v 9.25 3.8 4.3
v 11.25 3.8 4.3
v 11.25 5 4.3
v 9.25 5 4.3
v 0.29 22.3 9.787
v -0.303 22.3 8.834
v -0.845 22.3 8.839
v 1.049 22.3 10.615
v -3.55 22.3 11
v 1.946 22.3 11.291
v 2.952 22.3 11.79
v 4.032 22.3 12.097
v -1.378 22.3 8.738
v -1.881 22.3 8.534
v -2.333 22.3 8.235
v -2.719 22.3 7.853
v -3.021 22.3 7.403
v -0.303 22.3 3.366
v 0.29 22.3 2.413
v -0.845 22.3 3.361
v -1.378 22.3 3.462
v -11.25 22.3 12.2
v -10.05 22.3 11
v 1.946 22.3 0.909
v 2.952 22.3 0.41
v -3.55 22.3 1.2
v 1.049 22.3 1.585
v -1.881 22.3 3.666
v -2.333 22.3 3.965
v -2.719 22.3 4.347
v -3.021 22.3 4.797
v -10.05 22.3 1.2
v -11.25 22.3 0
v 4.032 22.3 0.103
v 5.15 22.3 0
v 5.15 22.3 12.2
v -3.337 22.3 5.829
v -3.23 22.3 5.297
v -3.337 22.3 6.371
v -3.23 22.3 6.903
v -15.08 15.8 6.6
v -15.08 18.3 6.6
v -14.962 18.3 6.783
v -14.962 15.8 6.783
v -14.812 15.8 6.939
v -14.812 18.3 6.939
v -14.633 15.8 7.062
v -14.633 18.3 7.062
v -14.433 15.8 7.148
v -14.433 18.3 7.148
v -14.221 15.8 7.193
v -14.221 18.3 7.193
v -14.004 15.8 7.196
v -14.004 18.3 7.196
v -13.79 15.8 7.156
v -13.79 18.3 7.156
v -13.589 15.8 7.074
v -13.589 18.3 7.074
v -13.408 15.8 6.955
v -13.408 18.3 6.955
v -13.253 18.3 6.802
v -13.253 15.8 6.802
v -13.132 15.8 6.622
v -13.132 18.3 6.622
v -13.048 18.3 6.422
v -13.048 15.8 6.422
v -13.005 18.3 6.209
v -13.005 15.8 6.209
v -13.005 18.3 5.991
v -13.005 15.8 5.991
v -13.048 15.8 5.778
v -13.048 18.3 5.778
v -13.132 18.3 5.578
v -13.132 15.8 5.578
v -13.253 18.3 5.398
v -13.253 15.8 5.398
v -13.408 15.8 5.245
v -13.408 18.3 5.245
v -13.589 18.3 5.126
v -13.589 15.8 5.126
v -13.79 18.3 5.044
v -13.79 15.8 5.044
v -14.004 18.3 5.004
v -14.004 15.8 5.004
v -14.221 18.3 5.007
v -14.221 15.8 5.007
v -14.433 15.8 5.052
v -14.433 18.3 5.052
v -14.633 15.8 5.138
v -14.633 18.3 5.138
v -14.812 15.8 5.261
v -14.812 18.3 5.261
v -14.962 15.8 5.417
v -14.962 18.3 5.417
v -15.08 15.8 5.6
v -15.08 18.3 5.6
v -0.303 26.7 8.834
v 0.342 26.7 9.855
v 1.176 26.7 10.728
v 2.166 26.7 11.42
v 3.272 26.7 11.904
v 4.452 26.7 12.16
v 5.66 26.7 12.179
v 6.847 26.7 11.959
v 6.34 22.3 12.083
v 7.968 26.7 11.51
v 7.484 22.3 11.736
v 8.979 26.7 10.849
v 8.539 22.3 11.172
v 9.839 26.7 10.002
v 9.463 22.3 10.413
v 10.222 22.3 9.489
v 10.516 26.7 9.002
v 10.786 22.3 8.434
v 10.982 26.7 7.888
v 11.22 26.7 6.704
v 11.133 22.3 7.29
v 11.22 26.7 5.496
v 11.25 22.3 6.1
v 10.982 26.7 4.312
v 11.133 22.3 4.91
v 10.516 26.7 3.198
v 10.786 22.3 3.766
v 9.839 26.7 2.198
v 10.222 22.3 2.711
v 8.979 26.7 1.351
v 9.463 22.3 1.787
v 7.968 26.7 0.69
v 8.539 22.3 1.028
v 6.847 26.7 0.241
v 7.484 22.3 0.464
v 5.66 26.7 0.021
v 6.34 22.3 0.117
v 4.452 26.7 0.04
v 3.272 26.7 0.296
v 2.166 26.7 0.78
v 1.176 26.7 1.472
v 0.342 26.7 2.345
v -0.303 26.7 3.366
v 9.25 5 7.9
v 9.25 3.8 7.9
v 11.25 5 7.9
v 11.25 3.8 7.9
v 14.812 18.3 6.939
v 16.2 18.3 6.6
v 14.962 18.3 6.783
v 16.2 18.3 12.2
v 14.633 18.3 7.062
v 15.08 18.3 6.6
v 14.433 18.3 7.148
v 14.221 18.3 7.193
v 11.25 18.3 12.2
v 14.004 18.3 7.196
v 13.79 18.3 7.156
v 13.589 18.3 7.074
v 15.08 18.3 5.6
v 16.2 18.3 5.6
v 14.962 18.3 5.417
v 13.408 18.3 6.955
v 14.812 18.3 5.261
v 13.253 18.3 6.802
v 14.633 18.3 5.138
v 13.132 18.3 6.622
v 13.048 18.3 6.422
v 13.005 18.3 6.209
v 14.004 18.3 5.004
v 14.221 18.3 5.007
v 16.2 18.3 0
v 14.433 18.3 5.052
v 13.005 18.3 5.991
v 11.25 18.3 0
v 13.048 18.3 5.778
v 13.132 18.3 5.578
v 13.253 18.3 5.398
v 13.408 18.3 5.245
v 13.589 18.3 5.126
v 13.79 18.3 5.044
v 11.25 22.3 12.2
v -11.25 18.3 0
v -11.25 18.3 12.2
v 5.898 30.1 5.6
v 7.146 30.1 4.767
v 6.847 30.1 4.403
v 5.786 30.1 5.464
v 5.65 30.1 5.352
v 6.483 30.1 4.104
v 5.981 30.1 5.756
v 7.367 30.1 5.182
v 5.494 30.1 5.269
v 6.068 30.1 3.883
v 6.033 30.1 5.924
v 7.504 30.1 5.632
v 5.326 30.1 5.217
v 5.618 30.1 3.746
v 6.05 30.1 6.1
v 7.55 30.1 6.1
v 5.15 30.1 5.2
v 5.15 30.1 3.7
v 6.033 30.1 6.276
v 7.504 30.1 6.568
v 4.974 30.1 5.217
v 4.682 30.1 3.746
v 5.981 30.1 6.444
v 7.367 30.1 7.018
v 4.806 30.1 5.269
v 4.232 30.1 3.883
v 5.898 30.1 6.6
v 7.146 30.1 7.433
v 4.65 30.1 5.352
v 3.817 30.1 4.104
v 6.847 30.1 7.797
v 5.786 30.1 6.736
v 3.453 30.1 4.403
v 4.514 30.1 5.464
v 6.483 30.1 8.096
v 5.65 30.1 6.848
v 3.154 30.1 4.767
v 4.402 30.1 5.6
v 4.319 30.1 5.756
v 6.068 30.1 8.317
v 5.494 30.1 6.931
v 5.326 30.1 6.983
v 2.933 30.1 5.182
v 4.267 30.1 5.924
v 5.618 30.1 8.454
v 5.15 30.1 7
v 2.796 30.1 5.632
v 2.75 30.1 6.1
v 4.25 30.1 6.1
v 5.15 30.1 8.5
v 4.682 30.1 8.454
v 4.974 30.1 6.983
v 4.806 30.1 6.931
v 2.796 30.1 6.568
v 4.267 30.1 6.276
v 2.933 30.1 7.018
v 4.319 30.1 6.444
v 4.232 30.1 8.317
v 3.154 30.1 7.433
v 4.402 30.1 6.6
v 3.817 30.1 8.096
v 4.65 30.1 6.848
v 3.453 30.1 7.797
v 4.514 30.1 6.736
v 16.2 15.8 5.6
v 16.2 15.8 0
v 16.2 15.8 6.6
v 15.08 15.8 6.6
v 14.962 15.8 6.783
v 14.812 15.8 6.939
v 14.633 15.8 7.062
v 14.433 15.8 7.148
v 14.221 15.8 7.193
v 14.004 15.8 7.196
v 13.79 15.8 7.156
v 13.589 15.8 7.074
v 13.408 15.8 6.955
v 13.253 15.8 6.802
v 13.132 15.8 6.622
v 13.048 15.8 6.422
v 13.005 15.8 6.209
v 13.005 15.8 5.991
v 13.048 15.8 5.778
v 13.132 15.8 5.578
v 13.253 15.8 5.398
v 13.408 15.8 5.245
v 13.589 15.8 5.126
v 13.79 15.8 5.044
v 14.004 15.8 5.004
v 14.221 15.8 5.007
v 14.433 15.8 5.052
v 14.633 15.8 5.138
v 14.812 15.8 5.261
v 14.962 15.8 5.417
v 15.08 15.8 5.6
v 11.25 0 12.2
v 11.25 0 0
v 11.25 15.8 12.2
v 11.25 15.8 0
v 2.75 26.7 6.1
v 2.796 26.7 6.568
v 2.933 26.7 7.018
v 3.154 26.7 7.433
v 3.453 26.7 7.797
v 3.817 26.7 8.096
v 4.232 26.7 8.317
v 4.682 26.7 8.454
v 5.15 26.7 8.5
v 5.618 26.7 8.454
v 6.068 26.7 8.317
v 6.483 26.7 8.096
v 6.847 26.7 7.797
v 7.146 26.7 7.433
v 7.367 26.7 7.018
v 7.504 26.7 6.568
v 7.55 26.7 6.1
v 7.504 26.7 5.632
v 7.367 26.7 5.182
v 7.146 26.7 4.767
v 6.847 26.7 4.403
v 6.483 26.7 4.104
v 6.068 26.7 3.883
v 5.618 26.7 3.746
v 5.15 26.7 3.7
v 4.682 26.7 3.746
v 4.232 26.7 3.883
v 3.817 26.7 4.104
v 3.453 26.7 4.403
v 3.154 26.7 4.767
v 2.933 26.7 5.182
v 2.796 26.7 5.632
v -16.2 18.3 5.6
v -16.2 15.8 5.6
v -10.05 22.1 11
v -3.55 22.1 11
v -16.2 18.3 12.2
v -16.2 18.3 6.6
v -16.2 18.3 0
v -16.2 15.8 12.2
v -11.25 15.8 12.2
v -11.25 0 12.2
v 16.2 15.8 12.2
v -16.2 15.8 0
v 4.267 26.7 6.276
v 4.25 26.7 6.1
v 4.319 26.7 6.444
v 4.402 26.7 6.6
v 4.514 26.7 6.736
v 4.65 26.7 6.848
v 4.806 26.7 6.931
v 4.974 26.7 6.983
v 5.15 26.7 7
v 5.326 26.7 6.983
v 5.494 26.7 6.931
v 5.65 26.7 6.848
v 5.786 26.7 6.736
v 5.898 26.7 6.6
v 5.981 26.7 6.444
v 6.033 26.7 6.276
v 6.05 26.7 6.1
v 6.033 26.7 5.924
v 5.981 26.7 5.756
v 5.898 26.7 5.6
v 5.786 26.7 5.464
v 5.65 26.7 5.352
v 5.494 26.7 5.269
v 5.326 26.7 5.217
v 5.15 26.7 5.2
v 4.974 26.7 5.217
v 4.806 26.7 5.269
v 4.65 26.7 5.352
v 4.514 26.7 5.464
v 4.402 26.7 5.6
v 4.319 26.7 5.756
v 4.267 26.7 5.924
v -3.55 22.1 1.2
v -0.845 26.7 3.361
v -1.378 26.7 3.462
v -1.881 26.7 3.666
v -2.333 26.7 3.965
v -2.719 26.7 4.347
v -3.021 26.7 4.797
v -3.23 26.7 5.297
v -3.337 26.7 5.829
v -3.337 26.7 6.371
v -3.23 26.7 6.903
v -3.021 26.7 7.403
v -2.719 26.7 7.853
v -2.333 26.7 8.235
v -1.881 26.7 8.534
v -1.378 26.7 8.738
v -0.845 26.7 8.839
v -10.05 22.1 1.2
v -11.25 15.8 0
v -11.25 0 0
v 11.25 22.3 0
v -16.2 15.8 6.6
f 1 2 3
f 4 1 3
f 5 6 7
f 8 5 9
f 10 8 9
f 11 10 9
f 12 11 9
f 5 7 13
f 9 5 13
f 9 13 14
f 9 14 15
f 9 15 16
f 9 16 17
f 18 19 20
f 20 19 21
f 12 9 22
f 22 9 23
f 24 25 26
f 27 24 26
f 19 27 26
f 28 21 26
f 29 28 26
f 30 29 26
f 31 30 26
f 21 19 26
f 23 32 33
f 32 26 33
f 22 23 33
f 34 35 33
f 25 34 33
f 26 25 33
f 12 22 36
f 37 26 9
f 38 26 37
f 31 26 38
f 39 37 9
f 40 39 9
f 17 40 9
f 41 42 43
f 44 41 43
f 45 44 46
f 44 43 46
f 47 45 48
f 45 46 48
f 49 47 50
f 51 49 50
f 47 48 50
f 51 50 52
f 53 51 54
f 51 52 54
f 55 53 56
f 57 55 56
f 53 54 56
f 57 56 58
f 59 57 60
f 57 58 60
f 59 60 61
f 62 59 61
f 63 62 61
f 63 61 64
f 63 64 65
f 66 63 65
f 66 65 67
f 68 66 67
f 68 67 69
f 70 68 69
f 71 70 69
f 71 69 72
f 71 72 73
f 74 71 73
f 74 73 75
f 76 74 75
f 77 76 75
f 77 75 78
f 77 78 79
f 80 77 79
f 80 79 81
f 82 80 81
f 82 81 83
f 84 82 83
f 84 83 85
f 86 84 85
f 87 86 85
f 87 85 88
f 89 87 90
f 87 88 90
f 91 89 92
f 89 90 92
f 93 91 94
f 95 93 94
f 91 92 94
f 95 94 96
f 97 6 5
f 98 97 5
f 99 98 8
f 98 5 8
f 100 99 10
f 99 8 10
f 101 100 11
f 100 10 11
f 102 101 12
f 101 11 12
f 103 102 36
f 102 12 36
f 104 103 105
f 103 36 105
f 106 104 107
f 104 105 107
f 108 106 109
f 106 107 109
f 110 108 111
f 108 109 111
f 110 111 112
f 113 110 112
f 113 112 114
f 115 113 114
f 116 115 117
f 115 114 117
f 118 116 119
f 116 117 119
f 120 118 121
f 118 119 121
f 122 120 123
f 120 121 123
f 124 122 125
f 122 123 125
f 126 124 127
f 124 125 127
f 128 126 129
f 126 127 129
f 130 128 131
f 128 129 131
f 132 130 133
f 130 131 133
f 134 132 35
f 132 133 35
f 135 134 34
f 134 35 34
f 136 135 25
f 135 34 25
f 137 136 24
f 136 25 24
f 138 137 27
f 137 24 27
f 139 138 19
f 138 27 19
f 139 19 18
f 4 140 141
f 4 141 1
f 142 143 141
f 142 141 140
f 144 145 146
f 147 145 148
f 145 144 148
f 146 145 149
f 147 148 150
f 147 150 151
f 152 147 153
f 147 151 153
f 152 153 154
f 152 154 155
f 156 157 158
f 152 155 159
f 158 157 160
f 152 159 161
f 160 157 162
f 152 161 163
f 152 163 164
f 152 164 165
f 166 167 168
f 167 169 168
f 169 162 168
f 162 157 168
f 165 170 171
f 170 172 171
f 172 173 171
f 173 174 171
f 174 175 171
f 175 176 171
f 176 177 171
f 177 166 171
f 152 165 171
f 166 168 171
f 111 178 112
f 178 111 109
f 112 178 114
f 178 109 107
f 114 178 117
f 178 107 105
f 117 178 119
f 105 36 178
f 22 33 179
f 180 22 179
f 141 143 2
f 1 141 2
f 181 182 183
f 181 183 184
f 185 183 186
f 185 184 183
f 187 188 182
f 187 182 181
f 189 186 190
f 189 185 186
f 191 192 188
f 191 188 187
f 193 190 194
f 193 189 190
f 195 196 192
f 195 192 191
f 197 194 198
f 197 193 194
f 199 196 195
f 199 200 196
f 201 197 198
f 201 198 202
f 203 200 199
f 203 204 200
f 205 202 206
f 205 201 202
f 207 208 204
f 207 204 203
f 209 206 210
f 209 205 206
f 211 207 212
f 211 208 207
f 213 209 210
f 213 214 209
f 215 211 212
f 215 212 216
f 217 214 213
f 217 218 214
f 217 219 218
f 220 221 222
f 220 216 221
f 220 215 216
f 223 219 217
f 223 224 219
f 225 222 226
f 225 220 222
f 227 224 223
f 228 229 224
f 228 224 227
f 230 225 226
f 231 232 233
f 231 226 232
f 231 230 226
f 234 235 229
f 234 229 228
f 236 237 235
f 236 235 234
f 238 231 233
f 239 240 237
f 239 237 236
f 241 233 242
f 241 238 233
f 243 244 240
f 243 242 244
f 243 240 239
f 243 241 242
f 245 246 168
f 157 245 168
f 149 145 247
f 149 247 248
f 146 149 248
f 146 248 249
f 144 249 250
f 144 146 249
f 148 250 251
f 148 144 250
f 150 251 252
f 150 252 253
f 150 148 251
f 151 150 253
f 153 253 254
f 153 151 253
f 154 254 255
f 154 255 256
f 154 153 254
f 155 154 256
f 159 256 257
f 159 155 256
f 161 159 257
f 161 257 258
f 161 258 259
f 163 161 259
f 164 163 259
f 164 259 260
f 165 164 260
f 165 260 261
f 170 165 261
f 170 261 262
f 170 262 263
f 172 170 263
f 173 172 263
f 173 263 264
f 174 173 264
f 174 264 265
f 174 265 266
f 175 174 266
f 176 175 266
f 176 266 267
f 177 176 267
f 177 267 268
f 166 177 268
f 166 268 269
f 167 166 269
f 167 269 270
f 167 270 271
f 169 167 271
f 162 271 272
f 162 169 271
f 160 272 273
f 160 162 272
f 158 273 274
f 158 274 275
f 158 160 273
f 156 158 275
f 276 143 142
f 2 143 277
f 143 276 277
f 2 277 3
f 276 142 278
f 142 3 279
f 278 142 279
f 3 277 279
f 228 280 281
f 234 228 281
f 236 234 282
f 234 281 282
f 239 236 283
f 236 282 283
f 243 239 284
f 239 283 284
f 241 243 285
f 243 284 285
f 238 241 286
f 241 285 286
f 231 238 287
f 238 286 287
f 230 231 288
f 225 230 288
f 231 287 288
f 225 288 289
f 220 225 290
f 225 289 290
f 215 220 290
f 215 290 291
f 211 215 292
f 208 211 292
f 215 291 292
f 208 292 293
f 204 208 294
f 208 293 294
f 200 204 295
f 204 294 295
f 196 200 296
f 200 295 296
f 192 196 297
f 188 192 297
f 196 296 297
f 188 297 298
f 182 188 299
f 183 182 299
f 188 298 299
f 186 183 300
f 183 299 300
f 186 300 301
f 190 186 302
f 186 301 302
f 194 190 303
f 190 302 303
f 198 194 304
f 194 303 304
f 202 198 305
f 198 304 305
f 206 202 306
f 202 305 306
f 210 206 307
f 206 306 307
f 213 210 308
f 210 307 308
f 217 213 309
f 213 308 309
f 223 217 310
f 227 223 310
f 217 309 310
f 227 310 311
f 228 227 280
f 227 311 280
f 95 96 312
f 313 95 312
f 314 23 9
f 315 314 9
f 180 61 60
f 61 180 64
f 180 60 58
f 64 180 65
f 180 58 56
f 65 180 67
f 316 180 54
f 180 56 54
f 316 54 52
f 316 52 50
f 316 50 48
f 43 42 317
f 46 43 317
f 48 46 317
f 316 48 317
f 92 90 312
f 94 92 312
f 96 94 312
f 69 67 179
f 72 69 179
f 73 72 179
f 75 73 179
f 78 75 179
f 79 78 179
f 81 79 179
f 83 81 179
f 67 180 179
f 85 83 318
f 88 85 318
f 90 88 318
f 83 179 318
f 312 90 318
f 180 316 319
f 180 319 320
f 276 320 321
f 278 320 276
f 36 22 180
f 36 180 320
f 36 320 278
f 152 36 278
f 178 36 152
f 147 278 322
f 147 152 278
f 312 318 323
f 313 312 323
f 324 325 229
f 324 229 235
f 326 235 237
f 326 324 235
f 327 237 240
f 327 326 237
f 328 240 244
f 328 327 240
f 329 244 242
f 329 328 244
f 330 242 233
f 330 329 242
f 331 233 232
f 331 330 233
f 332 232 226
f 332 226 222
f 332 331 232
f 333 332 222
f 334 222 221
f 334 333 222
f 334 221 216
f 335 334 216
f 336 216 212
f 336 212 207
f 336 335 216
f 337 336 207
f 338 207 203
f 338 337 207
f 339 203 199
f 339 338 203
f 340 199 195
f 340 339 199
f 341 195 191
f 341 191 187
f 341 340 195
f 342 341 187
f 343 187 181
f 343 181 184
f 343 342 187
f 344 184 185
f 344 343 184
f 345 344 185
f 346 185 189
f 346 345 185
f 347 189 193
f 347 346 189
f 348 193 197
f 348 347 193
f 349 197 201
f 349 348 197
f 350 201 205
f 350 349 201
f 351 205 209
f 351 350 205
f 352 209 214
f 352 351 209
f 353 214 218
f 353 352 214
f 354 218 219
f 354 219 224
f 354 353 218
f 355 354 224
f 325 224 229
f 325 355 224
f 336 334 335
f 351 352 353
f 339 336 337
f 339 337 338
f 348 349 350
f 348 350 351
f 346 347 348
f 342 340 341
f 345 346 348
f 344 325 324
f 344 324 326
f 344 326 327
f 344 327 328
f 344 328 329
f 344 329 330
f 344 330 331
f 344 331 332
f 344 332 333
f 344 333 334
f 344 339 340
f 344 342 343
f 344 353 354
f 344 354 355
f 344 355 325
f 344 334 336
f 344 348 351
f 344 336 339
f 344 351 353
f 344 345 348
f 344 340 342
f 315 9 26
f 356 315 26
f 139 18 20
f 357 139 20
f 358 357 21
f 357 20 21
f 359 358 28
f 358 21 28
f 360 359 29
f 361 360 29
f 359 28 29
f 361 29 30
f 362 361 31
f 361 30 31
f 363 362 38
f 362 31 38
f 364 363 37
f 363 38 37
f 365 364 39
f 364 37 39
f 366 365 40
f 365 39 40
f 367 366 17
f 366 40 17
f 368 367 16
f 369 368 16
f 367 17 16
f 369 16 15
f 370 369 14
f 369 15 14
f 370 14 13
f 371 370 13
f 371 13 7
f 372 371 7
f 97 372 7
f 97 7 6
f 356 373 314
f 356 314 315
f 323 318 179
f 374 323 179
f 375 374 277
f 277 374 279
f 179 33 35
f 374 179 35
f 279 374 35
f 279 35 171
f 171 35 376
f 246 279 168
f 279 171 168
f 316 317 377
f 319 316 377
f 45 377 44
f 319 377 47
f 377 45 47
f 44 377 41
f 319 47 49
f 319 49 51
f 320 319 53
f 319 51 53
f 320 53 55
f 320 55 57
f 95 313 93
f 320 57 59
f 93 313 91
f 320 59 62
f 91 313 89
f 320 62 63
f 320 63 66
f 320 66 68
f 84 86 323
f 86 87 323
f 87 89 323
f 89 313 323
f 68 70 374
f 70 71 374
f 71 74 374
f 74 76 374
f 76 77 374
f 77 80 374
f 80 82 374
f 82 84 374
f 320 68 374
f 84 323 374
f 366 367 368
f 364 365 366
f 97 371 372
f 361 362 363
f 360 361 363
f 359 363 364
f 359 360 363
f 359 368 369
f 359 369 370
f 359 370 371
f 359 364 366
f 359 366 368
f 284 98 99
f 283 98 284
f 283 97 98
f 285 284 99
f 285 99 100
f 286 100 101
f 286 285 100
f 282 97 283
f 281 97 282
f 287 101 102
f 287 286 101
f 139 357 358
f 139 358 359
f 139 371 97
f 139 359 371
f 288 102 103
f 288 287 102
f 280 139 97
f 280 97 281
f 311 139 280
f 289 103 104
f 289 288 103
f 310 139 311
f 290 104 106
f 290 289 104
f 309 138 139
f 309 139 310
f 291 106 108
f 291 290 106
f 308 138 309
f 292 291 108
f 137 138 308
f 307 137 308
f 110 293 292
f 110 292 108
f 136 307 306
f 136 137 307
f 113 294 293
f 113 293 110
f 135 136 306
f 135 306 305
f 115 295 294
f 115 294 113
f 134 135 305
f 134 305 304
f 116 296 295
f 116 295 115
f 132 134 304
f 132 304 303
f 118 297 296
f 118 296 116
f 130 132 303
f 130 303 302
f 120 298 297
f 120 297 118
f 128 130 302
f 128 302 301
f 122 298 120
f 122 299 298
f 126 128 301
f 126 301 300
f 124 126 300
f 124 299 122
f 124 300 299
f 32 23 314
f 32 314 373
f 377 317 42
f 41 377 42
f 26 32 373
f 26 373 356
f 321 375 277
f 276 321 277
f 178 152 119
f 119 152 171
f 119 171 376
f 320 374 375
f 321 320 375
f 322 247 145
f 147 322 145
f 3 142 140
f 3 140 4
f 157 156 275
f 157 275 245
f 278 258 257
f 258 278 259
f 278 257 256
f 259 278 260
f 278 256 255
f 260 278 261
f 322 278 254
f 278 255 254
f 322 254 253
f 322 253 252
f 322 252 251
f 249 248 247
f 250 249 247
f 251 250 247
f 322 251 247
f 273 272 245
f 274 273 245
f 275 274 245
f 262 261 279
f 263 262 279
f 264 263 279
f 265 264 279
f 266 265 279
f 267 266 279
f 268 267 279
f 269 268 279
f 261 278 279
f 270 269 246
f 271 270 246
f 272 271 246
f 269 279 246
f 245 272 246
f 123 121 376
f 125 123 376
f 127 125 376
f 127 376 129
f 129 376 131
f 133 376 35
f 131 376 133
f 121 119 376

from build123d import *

# Parameters (mm, degrees)
EXTRUDE_1_DEPTH     = 12.2
SKETCH_3_W          = 3.6
SKETCH_3_H          = 1.2
CUT_EXTRUDE_1_DEPTH = 2
EXTRUDE_2_DEPTH     = 4.4
SKETCH_4_3_W        = 6.5
SKETCH_4_3_H        = 9.8
CUT_EXTRUDE_2_DEPTH = 0.2
SKETCH_5_R          = 2.4
SKETCH_5_R_2        = 0.9
EXTRUDE_3_DEPTH     = 3.4
CUT_EXTRUDE_3_REACH = 29.316


with BuildPart() as part:
    # 草图1 → 凸台-拉伸1 (new body)
    with BuildSketch(Plane.XY):
        Polygon((-11.25, 0), (11.25, 0), (11.25, 15.8), (16.2, 15.8), (16.2, 18.3), (11.25, 18.3), (11.25, 22.3), (-11.25, 22.3), (-11.25, 18.3), (-16.2, 18.3), (-16.2, 15.8), (-11.25, 15.8), align=None)
    extrude(amount=EXTRUDE_1_DEPTH)

    # 草图3 → 切除-拉伸1 (cut)
    with BuildSketch(Plane(origin=(11.25, 0, 0), x_dir=(0, 0, -1), z_dir=(1, 0, 0))):
        with Locations((-6.1, 4.4)):
            Rectangle(SKETCH_3_W, SKETCH_3_H)
    extrude(amount=-CUT_EXTRUDE_1_DEPTH, mode=Mode.SUBTRACT)

    # 草图4 → 凸台-拉伸2 (add)
    with BuildSketch(Plane(origin=(0, 22.3, 0), x_dir=(1, 0, 0), z_dir=(0, 1, 0))):
        with BuildLine():
            ThreePointArc((-0.303043478, -8.833919681), (11.25, -6.1), (-0.303043478, -3.366080319))
            ThreePointArc((-0.303043478, -3.366080319), (-3.35, -6.1), (-0.303043478, -8.833919681))
        make_face()
    extrude(amount=EXTRUDE_2_DEPTH)

    # 草图4<3> → 切除-拉伸2 (cut)
    with BuildSketch(Plane(origin=(0, 22.3, 0), x_dir=(1, 0, 0), z_dir=(0, 1, 0))):
        with Locations((-6.8, -6.1)):
            Rectangle(SKETCH_4_3_W, SKETCH_4_3_H)
    extrude(amount=-CUT_EXTRUDE_2_DEPTH, mode=Mode.SUBTRACT)

    # 草图5 → 凸台-拉伸3 (add)
    with BuildSketch(Plane(origin=(0, 26.7, 0), x_dir=(1, 0, 0), z_dir=(0, 1, 0))):
        with Locations((5.15, -6.1)):
            Circle(SKETCH_5_R)
        with Locations((5.15, -6.1)):
            Circle(SKETCH_5_R_2, mode=Mode.SUBTRACT)
    extrude(amount=EXTRUDE_3_DEPTH)

    # 草图6 → 切除-拉伸3 (cut, up to next)
    with BuildSketch(Plane(origin=(0, 18.3, 0), x_dir=(1, 0, 0), z_dir=(0, 1, 0)), mode=Mode.PRIVATE) as cut_extrude_3_sk1:
        with BuildLine():
            Line((-16.2, -6.6), (-15.079795897, -6.6))
            ThreePointArc((-15.079795897, -6.6), (-13, -6.1), (-15.079795897, -5.6))
            Line((-15.079795897, -5.6), (-16.2, -5.6))
            Line((-16.2, -5.6), (-16.2, -6.6))
        make_face()
    cut_extrude_3_tool1 = extrude(cut_extrude_3_sk1.sketch, amount=-CUT_EXTRUDE_3_REACH, mode=Mode.PRIVATE) & part.part
    cut_extrude_3 = cut_extrude_3_tool1.solids().sort_by_distance((-14.439154, 18.3, 6.1))[0]
    add(cut_extrude_3, mode=Mode.SUBTRACT)

    # 镜向1: 切除-拉伸3 across plane
    add(cut_extrude_3.mirror(Plane(origin=(0, 0, 0), x_dir=(0, 0, 1), z_dir=(1, 0, 0))), mode=Mode.SUBTRACT)


solid = part.part
